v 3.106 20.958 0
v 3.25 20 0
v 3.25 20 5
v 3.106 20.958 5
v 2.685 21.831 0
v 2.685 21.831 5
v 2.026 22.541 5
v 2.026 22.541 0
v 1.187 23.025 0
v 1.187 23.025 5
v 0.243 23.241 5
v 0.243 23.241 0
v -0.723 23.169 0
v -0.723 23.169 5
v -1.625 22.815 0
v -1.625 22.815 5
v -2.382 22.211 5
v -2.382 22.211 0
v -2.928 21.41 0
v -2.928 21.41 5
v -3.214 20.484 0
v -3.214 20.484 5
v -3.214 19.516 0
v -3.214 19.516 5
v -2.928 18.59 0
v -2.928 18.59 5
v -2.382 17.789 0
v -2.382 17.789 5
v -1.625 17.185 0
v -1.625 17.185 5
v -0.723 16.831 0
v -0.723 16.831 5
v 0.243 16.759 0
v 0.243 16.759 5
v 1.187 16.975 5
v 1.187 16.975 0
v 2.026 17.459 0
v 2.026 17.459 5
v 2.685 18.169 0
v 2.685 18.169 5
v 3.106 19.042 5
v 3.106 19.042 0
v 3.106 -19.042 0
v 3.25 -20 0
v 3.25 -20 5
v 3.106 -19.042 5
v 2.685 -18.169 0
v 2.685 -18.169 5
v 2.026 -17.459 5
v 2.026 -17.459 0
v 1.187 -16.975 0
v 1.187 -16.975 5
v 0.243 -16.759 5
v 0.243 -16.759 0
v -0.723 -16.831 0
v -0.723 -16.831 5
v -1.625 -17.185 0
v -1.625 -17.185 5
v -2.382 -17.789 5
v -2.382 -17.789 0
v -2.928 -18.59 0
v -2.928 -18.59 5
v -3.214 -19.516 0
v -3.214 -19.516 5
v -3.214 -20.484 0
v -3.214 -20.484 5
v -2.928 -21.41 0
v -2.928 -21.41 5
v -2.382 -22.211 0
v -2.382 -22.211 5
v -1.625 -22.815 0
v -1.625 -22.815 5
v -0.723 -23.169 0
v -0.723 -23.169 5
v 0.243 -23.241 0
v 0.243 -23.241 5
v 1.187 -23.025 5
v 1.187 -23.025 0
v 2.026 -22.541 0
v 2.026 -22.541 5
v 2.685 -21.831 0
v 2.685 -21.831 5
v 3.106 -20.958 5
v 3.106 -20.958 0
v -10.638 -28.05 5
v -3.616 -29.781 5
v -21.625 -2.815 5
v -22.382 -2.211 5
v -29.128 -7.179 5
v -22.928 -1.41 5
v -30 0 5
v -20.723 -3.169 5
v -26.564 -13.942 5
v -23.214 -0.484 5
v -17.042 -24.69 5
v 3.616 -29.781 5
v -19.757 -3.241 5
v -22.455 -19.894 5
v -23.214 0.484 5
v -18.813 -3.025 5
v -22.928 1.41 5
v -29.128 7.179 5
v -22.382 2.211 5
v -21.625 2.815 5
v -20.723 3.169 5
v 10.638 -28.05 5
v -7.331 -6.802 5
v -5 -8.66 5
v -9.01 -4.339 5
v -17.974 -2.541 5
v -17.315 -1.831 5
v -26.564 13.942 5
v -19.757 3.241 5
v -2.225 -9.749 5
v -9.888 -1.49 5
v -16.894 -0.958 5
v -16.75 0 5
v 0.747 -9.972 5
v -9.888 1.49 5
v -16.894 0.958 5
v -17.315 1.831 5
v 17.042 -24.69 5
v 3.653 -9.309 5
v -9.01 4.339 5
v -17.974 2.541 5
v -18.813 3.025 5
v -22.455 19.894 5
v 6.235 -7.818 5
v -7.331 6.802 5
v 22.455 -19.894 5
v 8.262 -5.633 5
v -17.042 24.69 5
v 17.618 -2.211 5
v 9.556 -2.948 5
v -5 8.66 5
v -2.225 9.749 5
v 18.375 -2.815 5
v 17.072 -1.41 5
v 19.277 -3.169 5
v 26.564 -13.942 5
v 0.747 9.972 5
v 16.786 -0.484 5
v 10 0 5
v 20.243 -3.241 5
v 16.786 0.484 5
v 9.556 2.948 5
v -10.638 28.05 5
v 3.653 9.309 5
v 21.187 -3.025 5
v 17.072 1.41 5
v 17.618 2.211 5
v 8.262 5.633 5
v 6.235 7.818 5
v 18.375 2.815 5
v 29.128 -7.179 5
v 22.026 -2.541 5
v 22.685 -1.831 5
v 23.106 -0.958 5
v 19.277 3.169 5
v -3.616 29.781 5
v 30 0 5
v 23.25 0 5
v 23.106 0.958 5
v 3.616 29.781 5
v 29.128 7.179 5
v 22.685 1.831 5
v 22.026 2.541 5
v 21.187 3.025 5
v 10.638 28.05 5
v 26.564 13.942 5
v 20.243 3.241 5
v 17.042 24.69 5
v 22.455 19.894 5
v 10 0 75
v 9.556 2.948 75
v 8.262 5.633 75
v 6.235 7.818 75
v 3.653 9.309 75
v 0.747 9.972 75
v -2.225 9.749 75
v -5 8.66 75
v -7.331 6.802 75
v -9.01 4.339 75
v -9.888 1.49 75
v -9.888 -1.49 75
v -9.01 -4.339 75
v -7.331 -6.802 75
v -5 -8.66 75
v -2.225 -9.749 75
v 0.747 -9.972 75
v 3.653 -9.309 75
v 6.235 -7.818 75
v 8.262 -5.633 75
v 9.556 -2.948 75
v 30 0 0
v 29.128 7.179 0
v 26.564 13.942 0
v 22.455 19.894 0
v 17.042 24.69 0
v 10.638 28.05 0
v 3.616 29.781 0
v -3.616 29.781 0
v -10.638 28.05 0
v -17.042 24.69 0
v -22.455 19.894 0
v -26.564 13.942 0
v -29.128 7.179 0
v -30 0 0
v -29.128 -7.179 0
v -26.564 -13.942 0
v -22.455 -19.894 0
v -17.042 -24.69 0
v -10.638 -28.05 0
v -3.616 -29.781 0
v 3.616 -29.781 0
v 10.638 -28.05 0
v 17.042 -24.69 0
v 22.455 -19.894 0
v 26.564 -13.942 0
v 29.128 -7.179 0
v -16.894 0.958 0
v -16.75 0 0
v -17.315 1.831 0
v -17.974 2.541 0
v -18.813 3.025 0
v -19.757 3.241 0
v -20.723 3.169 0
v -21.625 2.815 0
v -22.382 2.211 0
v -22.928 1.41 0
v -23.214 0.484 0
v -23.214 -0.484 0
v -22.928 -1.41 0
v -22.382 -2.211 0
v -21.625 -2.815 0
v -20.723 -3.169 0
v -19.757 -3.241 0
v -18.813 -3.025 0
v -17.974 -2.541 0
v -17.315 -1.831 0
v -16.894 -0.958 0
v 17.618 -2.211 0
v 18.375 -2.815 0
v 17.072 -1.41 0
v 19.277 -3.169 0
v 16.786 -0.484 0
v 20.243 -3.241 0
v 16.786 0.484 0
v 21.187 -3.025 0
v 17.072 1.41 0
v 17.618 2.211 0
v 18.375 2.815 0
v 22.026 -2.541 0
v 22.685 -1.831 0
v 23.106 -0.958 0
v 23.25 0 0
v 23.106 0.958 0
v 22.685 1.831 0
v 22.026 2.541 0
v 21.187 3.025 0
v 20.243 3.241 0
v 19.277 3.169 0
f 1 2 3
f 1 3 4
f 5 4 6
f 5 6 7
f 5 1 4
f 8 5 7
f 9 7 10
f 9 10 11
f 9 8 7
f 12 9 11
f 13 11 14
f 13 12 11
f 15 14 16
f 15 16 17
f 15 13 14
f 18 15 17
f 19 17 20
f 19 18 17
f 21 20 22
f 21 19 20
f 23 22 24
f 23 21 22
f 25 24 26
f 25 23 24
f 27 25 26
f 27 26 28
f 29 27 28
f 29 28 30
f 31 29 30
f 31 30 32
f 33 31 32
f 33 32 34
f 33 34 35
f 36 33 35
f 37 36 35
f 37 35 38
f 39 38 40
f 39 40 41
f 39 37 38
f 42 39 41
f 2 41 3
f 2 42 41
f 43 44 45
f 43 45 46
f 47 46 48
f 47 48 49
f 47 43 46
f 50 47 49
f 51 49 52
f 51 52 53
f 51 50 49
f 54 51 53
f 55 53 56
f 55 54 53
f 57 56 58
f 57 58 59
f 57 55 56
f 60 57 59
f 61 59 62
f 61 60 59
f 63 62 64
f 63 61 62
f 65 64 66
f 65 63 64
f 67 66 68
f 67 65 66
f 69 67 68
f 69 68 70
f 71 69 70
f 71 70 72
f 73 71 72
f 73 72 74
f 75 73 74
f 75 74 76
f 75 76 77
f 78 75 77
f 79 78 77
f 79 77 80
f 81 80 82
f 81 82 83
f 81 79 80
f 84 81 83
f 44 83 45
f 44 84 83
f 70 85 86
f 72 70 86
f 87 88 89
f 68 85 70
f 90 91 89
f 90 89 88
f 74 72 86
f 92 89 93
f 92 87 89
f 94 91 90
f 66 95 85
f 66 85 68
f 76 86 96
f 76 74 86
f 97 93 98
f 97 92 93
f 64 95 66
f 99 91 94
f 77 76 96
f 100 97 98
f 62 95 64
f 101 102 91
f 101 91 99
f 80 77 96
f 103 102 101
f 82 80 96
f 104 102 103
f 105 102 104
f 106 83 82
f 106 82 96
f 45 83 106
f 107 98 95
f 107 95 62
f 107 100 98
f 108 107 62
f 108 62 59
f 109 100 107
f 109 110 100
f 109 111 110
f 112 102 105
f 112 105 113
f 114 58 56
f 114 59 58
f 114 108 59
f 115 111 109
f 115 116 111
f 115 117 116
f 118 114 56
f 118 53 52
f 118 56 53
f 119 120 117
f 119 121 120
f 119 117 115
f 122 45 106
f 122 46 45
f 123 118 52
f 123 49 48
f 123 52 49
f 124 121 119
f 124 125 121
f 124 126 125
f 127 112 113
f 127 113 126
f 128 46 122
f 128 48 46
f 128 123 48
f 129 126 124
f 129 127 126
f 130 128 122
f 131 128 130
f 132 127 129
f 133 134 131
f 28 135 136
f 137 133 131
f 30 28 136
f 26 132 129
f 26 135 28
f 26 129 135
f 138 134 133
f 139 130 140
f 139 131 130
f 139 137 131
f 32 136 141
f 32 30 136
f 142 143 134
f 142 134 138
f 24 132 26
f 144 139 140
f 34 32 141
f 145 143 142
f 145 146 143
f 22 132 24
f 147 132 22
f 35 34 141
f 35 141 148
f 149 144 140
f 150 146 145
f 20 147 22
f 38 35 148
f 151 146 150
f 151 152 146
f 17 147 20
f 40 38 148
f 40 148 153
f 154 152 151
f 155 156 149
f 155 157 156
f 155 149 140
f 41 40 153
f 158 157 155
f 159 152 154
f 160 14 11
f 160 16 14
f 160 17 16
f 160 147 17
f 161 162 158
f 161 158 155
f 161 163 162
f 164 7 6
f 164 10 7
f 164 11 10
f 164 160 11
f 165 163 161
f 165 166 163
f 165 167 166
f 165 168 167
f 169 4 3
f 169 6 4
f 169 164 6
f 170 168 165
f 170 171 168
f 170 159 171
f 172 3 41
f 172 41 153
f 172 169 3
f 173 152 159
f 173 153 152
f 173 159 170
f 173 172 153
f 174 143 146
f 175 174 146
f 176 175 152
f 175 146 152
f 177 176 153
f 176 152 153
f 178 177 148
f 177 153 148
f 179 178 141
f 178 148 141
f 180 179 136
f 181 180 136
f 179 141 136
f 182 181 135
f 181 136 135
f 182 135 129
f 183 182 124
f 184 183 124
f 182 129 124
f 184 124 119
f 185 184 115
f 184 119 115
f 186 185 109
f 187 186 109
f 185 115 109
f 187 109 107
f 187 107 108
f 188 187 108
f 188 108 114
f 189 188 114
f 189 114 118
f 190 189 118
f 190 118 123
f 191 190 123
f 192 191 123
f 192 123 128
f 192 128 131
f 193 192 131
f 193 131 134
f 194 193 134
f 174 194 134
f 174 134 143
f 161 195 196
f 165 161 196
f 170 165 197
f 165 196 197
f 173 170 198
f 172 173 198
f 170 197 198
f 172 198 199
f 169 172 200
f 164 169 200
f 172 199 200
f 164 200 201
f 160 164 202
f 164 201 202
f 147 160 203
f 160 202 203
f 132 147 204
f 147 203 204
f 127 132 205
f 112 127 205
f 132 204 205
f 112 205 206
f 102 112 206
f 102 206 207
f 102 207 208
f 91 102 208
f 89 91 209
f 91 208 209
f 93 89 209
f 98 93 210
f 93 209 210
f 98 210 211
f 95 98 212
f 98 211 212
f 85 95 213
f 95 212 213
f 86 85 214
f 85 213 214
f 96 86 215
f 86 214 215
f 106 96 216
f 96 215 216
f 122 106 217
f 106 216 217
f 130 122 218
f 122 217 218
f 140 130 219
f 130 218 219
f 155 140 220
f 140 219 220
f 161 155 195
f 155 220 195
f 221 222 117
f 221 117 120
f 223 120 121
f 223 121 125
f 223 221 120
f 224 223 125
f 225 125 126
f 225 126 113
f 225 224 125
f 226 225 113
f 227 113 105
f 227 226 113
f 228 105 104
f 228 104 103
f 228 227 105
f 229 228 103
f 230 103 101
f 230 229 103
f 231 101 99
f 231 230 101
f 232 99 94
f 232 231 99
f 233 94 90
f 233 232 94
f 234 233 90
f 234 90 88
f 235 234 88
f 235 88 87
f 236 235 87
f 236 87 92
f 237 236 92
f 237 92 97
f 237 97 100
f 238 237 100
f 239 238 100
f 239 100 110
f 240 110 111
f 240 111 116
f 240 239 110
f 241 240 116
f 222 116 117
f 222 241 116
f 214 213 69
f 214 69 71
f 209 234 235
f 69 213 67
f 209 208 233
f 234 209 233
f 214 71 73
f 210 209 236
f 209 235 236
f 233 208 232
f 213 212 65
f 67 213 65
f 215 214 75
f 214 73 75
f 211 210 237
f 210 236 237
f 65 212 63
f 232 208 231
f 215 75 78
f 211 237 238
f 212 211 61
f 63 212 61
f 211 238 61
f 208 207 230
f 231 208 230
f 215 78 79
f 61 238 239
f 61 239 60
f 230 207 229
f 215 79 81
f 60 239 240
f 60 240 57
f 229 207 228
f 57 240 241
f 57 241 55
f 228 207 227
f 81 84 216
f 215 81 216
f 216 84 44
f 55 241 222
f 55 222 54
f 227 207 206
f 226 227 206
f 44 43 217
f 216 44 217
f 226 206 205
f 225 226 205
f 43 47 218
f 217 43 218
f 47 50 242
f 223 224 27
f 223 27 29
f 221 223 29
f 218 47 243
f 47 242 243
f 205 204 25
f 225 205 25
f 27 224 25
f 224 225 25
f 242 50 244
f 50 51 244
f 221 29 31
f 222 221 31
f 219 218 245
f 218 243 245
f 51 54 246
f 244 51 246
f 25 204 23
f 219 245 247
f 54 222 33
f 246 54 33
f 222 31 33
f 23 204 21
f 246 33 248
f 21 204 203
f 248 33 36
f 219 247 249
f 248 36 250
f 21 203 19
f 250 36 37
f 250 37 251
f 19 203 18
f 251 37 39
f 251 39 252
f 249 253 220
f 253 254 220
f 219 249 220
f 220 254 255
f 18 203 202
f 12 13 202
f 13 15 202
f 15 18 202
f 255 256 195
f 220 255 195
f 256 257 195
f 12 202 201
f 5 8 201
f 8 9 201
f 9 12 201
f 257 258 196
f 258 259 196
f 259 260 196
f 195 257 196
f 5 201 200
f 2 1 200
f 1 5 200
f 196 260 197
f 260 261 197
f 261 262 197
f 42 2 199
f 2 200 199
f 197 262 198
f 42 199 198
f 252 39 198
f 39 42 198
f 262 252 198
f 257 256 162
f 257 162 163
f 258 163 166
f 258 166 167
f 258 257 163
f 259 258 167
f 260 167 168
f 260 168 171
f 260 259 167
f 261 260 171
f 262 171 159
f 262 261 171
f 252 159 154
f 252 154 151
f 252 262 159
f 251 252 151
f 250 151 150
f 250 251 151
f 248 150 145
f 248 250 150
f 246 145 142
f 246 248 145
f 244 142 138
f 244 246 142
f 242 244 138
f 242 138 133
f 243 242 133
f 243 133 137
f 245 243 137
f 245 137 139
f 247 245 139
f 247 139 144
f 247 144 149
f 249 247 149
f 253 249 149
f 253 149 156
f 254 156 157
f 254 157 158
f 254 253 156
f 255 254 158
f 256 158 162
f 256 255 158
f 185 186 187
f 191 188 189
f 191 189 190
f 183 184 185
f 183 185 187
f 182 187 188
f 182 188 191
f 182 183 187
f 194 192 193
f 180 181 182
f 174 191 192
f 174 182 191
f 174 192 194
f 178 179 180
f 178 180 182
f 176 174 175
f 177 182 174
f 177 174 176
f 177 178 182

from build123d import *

# Parameters (mm, degrees)
HUB_FLANGE_PROFILE_R   = 30
HUB_FLANGE_PROFILE_R_2 = 3.25
HUB_FLANGE_5MM_DEPTH   = 5
STUB_AXLE_PROFILE_R    = 10
STUB_AXLE_75MM_DEPTH   = 75


with BuildPart() as part:
    # Hub_Flange_Profile → Hub_Flange_5mm (new body)
    with BuildSketch(Plane.XY):
        Circle(HUB_FLANGE_PROFILE_R)
        with Locations((20, 0)):
            Circle(HUB_FLANGE_PROFILE_R_2, mode=Mode.SUBTRACT)
        with Locations((0, 20)):
            Circle(HUB_FLANGE_PROFILE_R_2, mode=Mode.SUBTRACT)
        with Locations((-20, 0)):
            Circle(HUB_FLANGE_PROFILE_R_2, mode=Mode.SUBTRACT)
        with Locations((0, -20)):
            Circle(HUB_FLANGE_PROFILE_R_2, mode=Mode.SUBTRACT)
    extrude(amount=HUB_FLANGE_5MM_DEPTH)

    # Stub_Axle_Profile → Stub_Axle_75mm (add)
    with BuildSketch(Plane.XY):
        Circle(STUB_AXLE_PROFILE_R)
    extrude(amount=STUB_AXLE_75MM_DEPTH)


solid = part.part
